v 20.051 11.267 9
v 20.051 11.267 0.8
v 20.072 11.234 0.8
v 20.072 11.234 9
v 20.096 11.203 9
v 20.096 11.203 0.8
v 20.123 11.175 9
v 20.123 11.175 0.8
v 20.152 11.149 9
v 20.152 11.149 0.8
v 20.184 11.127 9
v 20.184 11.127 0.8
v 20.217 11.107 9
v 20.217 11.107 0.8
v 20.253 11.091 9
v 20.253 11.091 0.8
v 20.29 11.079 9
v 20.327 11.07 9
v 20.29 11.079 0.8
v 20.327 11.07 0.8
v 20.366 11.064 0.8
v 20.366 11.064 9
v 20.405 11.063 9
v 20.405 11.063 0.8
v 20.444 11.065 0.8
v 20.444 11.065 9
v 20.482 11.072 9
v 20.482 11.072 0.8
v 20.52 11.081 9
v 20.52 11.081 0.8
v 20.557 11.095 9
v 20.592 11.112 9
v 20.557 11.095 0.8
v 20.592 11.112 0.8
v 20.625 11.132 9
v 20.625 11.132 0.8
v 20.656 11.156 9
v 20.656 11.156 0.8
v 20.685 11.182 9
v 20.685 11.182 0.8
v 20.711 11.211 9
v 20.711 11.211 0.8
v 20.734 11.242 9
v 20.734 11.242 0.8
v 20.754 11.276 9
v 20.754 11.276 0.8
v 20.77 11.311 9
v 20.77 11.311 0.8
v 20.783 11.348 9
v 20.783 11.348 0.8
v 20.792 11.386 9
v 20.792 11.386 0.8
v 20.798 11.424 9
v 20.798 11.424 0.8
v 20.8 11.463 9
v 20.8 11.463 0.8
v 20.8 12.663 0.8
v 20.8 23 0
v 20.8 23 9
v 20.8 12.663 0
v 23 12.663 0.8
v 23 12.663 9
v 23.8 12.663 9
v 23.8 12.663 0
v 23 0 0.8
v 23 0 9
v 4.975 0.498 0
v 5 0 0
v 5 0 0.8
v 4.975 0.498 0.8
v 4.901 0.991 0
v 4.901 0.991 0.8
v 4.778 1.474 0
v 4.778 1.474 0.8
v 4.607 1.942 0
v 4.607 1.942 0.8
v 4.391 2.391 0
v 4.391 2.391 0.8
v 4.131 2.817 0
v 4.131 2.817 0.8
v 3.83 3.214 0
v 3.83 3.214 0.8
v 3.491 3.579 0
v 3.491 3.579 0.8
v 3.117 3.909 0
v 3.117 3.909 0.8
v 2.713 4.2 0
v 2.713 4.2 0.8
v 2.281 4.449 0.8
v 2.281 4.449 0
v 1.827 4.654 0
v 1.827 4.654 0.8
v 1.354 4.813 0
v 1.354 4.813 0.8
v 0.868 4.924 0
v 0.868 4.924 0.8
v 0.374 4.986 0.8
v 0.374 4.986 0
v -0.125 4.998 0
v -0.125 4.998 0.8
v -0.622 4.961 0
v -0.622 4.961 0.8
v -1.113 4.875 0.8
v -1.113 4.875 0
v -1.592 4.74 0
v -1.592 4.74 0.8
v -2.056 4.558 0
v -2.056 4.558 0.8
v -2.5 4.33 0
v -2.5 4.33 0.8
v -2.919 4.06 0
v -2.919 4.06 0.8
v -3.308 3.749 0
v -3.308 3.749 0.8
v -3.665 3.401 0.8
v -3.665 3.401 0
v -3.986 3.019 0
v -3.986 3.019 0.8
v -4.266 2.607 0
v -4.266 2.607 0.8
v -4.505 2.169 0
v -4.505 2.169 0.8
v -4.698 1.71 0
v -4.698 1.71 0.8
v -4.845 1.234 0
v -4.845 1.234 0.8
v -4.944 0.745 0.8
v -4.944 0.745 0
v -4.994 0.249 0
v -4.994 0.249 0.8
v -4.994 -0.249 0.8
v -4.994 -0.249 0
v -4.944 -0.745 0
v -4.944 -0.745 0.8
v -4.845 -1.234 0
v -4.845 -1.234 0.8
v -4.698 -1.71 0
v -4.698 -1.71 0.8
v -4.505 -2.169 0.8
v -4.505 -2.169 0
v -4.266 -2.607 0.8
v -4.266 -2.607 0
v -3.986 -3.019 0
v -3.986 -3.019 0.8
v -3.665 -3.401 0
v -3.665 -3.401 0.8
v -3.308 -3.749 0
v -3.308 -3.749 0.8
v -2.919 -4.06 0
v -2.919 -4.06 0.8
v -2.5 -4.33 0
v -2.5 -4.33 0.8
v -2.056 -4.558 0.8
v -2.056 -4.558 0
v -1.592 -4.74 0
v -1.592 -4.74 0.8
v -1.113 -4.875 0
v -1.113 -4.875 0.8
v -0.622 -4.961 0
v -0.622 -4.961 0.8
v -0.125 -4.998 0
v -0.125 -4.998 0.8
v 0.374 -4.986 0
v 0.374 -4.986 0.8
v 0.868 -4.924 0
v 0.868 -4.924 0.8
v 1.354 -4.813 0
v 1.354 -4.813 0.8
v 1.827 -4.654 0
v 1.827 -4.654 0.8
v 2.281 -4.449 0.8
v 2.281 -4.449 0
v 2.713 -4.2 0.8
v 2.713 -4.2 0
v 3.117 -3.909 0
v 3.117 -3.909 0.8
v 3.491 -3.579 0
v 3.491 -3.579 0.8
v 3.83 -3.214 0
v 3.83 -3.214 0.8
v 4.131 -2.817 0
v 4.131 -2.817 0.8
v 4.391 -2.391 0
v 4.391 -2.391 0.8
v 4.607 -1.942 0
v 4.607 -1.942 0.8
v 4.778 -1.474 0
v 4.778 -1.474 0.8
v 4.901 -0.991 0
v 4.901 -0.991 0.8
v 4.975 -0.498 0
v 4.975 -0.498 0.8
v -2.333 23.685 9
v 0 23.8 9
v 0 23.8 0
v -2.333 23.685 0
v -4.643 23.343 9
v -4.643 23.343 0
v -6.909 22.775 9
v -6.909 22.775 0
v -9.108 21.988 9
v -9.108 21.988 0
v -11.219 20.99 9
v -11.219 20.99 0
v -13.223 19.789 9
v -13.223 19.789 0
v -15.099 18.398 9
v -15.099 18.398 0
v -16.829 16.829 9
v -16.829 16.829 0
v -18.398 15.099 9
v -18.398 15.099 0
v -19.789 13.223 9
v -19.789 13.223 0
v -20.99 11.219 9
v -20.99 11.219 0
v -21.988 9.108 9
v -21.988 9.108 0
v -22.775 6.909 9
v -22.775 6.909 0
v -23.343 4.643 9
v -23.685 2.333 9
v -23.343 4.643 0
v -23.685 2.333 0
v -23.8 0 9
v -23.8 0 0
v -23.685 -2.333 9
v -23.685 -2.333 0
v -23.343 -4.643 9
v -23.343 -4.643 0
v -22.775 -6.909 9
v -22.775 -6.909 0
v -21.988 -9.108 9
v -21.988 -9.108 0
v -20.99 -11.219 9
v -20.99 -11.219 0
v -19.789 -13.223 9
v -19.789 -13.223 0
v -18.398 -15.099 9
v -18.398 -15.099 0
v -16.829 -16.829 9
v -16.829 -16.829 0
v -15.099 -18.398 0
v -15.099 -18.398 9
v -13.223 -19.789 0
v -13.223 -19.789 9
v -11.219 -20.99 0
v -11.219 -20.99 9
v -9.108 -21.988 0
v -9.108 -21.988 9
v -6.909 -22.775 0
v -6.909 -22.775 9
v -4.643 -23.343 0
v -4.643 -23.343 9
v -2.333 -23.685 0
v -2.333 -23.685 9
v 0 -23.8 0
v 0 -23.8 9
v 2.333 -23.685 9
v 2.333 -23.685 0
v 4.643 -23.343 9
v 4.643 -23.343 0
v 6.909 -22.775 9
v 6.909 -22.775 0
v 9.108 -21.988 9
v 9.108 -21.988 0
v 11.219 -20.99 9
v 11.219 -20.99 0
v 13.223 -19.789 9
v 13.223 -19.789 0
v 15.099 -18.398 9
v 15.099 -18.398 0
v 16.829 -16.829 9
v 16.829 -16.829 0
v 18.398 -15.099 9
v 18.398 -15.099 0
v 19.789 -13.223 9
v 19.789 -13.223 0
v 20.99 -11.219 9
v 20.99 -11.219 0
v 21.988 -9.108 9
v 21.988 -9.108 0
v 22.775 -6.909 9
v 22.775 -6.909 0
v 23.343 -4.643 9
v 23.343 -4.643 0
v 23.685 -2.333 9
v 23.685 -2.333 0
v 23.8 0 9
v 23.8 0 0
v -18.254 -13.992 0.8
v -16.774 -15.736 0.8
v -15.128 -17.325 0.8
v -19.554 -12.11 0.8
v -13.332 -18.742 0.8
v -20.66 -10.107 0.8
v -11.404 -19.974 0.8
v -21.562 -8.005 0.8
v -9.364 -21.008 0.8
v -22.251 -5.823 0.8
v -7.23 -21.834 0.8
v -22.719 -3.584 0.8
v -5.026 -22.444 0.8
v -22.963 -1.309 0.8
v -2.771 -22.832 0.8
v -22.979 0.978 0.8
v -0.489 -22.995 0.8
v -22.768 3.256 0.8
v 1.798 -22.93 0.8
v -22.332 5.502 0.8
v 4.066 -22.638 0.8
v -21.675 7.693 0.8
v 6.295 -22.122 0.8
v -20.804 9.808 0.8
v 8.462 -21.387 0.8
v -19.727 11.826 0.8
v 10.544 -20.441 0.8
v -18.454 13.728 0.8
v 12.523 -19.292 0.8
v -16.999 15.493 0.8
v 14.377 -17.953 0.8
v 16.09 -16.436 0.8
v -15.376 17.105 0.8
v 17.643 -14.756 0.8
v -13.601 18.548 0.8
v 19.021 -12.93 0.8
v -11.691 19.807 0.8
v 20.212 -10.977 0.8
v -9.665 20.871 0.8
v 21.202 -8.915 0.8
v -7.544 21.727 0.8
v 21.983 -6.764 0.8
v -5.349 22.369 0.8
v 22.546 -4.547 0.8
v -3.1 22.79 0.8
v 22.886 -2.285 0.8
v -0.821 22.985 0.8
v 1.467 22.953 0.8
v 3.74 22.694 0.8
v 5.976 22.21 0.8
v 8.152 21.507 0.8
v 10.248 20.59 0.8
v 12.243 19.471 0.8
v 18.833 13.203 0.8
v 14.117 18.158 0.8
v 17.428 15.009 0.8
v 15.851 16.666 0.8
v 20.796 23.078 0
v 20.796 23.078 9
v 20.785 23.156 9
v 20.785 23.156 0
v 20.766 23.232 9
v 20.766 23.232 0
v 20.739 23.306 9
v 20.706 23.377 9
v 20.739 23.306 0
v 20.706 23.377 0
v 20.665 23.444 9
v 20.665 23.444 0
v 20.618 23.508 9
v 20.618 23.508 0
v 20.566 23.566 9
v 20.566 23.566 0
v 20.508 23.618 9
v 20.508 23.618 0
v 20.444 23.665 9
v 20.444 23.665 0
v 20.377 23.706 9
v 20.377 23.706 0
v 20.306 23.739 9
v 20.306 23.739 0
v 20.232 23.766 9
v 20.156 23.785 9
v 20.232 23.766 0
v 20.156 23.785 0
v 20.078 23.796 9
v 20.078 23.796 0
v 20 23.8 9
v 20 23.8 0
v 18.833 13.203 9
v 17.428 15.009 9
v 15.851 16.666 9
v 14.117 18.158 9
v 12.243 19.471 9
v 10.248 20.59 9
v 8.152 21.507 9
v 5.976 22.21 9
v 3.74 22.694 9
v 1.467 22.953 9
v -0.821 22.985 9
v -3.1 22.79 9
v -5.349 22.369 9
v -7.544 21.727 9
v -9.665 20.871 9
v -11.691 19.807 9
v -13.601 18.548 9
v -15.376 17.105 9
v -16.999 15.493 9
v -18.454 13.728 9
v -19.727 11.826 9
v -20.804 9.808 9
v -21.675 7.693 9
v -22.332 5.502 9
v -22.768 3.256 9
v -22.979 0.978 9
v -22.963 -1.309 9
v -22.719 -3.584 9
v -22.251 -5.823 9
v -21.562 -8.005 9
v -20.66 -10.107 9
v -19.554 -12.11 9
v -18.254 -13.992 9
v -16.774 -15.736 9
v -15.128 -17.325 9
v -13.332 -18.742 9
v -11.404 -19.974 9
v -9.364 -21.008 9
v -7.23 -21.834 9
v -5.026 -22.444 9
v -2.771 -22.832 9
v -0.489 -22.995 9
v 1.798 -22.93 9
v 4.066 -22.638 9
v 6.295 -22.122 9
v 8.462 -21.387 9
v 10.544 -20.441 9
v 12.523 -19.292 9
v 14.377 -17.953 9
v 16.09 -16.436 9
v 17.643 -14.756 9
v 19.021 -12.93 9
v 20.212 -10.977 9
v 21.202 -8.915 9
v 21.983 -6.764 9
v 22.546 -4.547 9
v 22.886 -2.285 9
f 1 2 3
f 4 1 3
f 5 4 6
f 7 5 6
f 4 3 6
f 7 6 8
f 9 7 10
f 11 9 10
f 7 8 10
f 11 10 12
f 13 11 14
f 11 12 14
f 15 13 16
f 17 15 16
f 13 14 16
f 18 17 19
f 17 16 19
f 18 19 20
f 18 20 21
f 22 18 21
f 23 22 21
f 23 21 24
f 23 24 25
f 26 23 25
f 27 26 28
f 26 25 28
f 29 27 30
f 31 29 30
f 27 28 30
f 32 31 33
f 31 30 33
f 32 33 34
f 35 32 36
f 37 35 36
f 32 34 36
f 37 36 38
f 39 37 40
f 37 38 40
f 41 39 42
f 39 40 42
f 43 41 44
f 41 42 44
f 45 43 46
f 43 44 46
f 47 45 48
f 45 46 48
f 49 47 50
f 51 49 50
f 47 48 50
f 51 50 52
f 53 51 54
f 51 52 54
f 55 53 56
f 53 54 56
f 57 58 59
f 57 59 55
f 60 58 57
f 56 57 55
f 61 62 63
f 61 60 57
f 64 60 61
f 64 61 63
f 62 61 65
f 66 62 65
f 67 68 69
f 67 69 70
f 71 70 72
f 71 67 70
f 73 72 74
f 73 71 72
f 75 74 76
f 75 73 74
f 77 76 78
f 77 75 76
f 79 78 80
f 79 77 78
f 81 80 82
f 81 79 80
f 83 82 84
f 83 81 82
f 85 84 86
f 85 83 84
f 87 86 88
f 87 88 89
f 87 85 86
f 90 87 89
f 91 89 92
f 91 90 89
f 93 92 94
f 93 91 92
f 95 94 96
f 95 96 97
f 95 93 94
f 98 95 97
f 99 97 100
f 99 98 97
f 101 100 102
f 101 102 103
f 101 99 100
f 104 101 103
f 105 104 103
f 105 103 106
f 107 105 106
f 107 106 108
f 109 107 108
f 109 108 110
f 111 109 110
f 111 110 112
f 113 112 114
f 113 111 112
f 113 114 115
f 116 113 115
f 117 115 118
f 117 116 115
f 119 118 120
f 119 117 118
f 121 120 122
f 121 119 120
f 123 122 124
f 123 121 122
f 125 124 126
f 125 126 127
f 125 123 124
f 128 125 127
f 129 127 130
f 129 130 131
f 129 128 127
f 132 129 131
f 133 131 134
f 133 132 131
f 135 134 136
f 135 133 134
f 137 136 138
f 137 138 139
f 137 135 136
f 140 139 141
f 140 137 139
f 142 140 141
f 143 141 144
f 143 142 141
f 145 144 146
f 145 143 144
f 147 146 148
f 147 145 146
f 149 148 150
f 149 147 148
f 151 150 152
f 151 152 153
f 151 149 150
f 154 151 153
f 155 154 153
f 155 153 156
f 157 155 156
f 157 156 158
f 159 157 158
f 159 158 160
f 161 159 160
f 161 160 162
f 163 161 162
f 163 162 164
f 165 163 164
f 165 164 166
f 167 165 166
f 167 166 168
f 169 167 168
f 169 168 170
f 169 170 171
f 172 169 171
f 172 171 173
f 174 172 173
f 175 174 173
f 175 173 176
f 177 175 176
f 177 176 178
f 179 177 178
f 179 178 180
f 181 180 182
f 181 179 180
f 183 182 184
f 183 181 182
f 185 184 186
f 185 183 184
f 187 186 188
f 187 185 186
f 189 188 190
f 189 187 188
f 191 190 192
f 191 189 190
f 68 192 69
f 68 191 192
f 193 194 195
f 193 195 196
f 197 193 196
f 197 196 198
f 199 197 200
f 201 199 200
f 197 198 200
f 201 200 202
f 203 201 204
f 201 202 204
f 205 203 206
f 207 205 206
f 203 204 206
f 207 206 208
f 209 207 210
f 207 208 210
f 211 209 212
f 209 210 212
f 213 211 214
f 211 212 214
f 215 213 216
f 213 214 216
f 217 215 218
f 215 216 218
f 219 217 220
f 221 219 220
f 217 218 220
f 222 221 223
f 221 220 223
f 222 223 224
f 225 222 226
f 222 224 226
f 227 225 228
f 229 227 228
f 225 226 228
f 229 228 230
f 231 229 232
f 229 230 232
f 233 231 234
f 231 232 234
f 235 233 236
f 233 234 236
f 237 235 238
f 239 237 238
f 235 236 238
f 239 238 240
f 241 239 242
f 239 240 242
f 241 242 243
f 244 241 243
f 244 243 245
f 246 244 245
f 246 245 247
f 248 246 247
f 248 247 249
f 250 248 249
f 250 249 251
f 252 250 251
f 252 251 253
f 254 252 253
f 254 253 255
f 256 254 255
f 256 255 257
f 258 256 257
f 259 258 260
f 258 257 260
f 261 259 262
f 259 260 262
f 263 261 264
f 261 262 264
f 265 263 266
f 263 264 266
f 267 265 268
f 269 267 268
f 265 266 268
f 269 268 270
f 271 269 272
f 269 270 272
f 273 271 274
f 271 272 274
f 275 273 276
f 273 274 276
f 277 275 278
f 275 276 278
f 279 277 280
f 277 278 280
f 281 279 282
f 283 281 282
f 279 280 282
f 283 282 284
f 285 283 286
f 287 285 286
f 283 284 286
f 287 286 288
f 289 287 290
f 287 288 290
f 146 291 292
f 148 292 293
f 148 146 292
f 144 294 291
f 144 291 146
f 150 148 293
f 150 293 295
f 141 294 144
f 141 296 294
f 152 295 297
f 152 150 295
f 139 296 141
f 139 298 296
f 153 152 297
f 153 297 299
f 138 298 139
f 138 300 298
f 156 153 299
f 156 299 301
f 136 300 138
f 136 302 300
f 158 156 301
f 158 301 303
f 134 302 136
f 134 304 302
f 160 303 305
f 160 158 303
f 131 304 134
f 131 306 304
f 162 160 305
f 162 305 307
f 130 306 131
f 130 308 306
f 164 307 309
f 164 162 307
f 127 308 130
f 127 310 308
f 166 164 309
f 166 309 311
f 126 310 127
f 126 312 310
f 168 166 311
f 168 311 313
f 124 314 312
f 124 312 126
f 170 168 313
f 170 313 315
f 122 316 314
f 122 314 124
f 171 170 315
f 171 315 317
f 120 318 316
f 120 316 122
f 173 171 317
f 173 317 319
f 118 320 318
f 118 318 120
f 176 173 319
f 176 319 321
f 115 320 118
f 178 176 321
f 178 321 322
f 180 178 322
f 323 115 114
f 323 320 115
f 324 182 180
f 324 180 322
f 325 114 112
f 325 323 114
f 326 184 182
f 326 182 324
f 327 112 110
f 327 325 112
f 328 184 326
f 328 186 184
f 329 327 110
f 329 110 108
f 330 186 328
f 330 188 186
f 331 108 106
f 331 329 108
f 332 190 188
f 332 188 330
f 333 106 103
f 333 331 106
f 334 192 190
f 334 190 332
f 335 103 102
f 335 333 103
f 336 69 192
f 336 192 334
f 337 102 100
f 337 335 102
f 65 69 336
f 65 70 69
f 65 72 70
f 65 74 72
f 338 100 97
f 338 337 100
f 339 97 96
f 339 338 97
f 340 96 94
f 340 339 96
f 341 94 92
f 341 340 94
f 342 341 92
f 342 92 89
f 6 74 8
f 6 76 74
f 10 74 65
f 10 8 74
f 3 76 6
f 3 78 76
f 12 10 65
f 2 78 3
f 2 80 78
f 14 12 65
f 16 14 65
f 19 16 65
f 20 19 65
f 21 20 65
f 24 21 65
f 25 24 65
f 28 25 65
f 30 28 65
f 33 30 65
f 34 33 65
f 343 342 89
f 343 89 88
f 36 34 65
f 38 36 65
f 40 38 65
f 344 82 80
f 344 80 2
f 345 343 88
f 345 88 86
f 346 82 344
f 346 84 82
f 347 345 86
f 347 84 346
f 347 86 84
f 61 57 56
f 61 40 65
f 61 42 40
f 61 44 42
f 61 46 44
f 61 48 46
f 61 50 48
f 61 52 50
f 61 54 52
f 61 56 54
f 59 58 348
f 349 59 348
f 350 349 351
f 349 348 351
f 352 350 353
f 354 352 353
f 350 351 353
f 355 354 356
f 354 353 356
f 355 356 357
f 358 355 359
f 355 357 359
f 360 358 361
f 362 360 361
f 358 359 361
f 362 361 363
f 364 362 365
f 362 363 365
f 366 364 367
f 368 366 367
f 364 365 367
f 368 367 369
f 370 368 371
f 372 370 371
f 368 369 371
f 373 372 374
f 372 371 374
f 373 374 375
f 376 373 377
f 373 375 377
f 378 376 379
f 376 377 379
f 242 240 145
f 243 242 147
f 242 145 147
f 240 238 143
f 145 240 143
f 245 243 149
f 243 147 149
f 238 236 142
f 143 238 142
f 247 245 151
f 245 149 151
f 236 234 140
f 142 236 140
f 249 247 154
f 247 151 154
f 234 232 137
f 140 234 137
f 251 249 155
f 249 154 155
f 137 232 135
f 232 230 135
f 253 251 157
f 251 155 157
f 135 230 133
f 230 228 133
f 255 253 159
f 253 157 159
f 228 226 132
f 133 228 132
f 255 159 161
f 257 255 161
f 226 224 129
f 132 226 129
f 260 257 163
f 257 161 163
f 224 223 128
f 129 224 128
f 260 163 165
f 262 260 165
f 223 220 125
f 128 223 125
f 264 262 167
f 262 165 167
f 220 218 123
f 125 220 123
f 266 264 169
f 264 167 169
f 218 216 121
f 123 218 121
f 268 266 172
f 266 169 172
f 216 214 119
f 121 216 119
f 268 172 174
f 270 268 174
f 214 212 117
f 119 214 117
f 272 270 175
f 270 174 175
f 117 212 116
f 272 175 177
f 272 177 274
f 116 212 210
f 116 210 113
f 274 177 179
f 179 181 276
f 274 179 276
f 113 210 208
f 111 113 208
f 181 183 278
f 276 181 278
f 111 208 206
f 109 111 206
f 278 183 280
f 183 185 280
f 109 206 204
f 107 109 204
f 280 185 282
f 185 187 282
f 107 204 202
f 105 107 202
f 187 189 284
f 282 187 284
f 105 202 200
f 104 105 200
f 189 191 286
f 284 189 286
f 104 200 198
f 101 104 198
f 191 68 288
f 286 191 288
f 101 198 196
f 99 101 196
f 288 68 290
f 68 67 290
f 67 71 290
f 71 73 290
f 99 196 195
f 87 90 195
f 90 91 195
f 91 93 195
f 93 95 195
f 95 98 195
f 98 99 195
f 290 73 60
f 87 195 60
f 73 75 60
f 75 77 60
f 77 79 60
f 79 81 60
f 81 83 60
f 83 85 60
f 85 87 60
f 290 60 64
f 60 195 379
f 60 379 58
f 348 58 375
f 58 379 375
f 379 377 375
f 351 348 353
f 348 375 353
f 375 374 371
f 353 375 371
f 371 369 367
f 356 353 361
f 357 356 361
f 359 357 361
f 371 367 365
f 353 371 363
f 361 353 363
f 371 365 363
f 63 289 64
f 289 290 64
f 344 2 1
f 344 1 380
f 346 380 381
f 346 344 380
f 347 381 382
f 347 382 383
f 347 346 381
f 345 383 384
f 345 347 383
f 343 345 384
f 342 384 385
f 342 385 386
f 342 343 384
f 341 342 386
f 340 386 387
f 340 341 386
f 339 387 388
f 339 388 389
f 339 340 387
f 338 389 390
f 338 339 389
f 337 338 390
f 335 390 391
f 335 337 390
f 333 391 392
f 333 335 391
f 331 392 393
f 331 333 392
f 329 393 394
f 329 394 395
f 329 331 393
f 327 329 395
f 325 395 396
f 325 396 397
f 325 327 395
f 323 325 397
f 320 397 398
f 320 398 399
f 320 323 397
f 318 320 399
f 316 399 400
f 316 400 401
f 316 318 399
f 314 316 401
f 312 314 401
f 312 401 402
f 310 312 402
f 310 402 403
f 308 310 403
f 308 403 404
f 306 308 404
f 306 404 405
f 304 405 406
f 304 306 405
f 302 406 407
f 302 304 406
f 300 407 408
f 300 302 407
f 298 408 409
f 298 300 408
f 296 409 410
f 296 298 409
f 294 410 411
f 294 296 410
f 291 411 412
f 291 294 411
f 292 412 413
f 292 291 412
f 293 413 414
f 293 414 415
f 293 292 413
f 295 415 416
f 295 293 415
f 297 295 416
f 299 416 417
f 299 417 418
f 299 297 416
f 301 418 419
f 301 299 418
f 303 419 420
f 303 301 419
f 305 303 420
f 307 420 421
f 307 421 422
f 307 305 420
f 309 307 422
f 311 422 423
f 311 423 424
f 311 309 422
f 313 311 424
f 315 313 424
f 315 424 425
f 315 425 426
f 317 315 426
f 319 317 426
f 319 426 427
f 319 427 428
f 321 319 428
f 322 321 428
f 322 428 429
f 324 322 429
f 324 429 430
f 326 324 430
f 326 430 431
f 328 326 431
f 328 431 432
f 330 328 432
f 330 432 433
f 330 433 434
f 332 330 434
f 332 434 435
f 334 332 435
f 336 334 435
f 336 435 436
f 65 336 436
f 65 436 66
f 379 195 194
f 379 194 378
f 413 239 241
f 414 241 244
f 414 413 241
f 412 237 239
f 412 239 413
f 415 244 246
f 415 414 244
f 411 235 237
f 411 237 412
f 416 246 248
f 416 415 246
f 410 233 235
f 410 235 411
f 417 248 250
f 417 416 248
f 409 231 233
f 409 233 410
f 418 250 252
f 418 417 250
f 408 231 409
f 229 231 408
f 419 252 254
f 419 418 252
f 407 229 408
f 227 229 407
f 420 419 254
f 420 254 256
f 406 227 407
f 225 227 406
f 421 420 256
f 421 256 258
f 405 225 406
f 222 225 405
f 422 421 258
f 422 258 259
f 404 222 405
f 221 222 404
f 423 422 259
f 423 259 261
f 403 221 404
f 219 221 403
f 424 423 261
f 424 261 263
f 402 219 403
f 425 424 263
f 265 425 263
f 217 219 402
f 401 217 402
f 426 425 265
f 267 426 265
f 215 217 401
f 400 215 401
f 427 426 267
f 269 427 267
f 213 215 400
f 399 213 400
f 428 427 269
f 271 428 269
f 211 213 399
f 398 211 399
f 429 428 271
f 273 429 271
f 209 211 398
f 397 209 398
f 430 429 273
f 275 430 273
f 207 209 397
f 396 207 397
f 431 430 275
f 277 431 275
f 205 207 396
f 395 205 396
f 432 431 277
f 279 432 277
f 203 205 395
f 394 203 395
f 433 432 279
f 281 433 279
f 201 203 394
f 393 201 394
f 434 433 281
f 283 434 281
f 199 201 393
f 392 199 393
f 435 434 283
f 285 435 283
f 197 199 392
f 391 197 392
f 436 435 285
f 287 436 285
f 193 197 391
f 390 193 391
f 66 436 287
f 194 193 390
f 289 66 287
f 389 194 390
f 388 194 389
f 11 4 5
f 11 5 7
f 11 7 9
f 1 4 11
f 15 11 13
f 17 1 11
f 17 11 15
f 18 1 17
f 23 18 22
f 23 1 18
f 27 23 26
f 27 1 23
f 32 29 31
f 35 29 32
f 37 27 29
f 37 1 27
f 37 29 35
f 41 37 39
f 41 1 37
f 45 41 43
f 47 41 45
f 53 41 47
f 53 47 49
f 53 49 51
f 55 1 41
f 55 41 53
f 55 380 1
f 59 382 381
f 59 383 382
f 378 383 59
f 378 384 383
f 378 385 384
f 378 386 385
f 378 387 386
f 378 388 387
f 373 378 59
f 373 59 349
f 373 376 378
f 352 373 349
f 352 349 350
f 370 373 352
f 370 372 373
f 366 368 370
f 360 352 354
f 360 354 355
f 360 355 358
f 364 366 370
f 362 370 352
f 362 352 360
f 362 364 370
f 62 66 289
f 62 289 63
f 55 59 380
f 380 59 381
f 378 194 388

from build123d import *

# Parameters (mm, degrees)
SKETCH001_R  = 5
PAD_DEPTH    = 0.8
PAD001_DEPTH = 8.2


with BuildPart() as part:
    # Sketch001 → Pad (new body)
    with BuildSketch(Plane.XY):
        with BuildLine():
            ThreePointArc((0, 23.8), (-16.829141, -16.829141), (23.8, 0))
            Line((23.8, 12.662984), (23.8, 0))
            Line((20.8, 12.662984), (23.8, 12.662984))
            Line((20.8, 23), (20.8, 12.662984))
            ThreePointArc((20.8, 23), (20.565685, 23.565685), (20, 23.8))
            Line((0, 23.8), (20, 23.8))
        make_face()
        Circle(SKETCH001_R, mode=Mode.SUBTRACT)
    extrude(amount=PAD_DEPTH)

    # Sketch002 → Pad001 (join)
    with BuildSketch(Plane.XY.offset(0.8)):
        with BuildLine():
            ThreePointArc((0, 23.8), (-16.829141, -16.829141), (23.8, 0))
            Line((23.8, 0), (23.8, 12.662984))
            Line((23, 12.662984), (23.8, 12.662984))
            Line((23, 12.662984), (23, 0))
            ThreePointArc((20.051282, 11.267035), (-22.250612, -5.823251), (23, 0))
            ThreePointArc((20.051282, 11.267035), (20.501274, 11.076017), (20.8, 11.462984))
            Line((20.8, 23), (20.8, 11.462984))
            ThreePointArc((20.8, 23), (20.565685, 23.565685), (20, 23.8))
            Line((0, 23.8), (20, 23.8))
        make_face()
    extrude(amount=PAD001_DEPTH)


solid = part.part
